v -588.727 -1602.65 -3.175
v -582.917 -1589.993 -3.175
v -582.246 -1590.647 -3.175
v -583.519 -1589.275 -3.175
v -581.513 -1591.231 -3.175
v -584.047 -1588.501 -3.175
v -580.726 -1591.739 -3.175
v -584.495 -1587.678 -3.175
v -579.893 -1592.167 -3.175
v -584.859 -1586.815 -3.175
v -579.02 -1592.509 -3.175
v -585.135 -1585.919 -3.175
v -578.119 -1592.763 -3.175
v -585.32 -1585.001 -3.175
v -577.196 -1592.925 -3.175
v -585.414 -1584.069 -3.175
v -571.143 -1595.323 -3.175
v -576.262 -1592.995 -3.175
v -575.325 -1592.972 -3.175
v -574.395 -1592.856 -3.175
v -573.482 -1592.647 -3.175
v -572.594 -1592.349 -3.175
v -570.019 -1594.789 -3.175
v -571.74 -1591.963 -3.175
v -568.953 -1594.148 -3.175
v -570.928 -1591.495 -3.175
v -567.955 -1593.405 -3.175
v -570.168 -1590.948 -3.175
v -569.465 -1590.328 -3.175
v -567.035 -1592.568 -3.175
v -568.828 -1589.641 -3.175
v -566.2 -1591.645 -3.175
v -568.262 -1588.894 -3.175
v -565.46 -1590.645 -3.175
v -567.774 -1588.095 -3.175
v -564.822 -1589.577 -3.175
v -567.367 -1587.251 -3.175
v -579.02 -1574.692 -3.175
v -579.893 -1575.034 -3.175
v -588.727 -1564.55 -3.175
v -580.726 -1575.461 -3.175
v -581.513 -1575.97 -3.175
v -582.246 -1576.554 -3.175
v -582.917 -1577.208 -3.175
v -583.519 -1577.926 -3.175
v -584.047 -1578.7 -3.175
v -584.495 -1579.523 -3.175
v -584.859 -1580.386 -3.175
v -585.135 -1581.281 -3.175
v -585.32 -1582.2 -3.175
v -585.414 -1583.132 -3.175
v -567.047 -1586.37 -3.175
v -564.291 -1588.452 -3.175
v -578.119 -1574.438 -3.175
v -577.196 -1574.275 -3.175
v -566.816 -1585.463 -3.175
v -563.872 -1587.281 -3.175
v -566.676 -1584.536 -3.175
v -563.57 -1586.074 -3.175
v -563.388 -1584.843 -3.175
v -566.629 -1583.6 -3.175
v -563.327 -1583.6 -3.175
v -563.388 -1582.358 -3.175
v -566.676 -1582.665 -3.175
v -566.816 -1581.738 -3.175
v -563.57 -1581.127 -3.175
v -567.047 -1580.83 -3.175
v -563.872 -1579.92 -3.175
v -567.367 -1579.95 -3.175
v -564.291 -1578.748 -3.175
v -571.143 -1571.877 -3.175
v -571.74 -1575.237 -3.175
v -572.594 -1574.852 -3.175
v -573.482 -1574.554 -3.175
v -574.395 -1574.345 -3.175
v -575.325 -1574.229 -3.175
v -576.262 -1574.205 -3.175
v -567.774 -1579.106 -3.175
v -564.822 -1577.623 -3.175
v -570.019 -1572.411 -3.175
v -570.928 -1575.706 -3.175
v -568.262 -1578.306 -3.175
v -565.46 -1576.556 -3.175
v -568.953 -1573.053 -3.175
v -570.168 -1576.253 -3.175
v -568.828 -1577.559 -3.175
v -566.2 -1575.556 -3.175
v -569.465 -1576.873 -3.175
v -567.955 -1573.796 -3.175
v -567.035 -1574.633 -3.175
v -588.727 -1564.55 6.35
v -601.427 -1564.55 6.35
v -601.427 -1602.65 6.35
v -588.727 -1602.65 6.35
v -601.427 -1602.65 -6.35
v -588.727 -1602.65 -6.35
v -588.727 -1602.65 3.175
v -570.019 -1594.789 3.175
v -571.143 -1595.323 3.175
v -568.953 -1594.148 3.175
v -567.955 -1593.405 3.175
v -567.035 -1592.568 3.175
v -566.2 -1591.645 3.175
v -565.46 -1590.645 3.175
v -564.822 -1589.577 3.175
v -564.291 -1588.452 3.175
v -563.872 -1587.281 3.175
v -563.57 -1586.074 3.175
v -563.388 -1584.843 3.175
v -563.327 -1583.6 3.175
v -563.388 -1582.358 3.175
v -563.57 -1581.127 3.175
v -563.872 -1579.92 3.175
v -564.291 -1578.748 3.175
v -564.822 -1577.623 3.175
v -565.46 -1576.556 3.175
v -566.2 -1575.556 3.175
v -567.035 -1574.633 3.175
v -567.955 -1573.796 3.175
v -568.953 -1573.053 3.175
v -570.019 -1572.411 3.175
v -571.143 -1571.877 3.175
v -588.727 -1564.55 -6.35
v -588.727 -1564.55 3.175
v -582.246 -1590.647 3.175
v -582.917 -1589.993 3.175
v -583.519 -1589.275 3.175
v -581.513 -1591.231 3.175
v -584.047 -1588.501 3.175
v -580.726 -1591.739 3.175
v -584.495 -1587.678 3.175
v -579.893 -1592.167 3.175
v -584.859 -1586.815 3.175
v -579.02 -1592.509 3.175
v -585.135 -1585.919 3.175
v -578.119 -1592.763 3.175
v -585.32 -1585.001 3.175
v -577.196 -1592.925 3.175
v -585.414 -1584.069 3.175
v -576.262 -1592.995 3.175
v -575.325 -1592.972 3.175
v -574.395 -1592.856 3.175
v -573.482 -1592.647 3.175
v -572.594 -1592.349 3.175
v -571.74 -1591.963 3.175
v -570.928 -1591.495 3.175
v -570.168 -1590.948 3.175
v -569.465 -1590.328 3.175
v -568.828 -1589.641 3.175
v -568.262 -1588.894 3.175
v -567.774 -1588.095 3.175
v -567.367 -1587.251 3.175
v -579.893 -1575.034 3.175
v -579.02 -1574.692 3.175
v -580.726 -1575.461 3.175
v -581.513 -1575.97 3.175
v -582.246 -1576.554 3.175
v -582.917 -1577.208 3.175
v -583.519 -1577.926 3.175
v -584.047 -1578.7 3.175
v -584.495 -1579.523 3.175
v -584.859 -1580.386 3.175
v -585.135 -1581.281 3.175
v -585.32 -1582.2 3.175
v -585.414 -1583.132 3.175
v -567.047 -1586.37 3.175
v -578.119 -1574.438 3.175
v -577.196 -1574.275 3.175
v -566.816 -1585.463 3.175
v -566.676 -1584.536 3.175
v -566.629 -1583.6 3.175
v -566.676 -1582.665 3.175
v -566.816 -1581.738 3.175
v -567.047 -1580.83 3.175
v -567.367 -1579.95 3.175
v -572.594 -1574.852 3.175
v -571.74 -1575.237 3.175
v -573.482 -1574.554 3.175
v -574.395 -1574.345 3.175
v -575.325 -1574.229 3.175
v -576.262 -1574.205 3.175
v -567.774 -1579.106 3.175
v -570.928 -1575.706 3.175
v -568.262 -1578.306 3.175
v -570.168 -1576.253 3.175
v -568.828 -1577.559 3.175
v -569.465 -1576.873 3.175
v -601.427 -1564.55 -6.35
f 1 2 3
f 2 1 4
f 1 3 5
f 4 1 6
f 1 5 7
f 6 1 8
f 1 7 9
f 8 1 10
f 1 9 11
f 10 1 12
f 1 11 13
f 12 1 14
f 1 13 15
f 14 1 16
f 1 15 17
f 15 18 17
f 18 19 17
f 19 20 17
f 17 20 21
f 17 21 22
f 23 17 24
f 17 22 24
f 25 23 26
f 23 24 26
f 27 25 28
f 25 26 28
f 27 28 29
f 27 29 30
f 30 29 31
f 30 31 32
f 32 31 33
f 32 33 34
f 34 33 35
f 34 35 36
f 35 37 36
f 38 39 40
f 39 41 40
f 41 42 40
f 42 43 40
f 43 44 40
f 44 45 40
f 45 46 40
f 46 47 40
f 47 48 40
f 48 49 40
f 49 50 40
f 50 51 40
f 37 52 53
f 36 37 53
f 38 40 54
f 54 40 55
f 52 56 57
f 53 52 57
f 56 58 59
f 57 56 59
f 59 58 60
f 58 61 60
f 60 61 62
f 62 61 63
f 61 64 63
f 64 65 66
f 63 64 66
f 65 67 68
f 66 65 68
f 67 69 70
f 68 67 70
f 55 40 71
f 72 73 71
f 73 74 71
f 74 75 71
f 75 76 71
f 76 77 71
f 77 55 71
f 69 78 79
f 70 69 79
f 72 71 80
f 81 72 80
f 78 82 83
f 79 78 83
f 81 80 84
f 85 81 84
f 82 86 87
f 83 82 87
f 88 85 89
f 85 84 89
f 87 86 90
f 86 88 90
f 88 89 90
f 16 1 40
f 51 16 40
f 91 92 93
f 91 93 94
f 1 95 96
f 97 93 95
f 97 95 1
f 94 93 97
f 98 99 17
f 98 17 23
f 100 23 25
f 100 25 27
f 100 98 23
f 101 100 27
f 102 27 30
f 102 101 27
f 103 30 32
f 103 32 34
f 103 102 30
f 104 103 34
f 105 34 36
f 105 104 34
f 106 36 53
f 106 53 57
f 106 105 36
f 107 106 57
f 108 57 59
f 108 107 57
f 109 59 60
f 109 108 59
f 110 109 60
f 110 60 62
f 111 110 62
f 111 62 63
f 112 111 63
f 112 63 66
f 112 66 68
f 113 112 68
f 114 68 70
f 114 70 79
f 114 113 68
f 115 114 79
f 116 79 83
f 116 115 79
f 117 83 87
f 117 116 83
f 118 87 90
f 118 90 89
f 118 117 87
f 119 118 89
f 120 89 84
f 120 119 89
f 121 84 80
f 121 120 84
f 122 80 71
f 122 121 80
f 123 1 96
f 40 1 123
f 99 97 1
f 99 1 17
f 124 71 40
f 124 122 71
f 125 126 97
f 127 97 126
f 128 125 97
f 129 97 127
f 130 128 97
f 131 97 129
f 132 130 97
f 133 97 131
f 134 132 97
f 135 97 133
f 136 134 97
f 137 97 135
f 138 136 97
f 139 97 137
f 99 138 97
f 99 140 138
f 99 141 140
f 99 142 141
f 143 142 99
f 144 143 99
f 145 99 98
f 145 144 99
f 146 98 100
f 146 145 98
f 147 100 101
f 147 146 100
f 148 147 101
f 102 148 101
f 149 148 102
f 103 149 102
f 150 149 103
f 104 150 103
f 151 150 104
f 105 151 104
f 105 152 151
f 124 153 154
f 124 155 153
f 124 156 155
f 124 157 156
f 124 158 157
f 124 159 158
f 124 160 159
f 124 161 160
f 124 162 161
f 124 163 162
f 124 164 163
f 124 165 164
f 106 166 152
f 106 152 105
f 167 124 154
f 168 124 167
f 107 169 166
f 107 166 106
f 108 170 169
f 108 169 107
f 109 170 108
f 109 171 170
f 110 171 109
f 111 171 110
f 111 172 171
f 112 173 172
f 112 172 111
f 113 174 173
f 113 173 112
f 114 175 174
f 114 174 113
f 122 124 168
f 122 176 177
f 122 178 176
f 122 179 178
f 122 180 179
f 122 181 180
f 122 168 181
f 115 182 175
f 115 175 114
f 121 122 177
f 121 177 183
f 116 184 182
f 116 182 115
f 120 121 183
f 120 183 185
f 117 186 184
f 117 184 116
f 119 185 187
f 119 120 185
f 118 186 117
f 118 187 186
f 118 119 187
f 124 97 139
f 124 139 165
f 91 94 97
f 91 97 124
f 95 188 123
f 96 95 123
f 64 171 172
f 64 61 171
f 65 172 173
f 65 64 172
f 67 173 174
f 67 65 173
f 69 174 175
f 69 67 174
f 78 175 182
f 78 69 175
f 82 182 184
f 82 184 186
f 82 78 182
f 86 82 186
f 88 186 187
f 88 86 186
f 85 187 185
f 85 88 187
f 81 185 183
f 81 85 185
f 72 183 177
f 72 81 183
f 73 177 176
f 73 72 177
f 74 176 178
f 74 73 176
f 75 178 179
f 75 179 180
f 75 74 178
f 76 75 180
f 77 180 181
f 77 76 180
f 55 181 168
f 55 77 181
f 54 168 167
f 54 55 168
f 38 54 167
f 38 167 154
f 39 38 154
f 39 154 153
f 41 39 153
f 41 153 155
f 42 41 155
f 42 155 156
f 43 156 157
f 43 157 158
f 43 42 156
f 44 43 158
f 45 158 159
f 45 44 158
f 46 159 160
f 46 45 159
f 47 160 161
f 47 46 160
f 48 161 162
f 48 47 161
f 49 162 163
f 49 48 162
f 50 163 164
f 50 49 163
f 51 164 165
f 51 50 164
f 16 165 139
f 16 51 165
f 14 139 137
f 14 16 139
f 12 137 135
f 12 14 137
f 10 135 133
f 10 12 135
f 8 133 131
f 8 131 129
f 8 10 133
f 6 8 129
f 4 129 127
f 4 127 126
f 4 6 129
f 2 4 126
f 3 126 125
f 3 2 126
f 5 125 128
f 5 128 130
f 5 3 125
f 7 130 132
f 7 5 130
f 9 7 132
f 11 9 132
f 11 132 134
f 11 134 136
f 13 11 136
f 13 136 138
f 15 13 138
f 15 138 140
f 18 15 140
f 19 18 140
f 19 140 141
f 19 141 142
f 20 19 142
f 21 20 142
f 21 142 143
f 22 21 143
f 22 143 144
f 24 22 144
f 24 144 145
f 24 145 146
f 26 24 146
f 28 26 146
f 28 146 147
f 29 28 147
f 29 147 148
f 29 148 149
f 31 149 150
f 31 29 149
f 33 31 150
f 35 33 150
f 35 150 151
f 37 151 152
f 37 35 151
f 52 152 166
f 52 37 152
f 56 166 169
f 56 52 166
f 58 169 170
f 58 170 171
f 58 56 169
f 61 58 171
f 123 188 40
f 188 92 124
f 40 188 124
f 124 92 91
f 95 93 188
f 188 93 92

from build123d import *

# Parameters (mm, degrees)
SKETCH1_R           = 9.398
BOSS_EXTRUDE1_DEPTH = 3.175
SKETCH2_W           = 12.7
SKETCH2_H           = 38.1
BOSS_EXTRUDE2_DEPTH = 6.35


with BuildPart() as part:
    # Sketch1 → Boss-Extrude1 (new body, symmetric)
    with BuildSketch(Plane.XY):
        with BuildLine():
            Line((-601.427317331, -1564.55033403), (-601.427317331, -1602.65033403))
            Line((-601.427317331, -1602.65033403), (-588.727317331, -1602.65033403))
            Line((-588.727317331, -1602.65033403), (-571.142701946, -1595.323410953))
            ThreePointArc((-571.142701946, -1595.323410953), (-563.327317331, -1583.60033403), (-571.142701946, -1571.877257107))
            Line((-571.142701946, -1571.877257107), (-588.727317331, -1564.55033403))
            Line((-588.727317331, -1564.55033403), (-601.427317331, -1564.55033403))
        make_face()
        with Locations((-576.027317331, -1583.60033403)):
            Circle(SKETCH1_R, mode=Mode.SUBTRACT)
    extrude(amount=BOSS_EXTRUDE1_DEPTH, both=True)

    # Sketch2 → Boss-Extrude2 (add, symmetric)
    with BuildSketch(Plane.XY):
        with Locations((-595.077317331, -1583.60033403)):
            Rectangle(SKETCH2_W, SKETCH2_H)
    extrude(amount=BOSS_EXTRUDE2_DEPTH, both=True)


solid = part.part
